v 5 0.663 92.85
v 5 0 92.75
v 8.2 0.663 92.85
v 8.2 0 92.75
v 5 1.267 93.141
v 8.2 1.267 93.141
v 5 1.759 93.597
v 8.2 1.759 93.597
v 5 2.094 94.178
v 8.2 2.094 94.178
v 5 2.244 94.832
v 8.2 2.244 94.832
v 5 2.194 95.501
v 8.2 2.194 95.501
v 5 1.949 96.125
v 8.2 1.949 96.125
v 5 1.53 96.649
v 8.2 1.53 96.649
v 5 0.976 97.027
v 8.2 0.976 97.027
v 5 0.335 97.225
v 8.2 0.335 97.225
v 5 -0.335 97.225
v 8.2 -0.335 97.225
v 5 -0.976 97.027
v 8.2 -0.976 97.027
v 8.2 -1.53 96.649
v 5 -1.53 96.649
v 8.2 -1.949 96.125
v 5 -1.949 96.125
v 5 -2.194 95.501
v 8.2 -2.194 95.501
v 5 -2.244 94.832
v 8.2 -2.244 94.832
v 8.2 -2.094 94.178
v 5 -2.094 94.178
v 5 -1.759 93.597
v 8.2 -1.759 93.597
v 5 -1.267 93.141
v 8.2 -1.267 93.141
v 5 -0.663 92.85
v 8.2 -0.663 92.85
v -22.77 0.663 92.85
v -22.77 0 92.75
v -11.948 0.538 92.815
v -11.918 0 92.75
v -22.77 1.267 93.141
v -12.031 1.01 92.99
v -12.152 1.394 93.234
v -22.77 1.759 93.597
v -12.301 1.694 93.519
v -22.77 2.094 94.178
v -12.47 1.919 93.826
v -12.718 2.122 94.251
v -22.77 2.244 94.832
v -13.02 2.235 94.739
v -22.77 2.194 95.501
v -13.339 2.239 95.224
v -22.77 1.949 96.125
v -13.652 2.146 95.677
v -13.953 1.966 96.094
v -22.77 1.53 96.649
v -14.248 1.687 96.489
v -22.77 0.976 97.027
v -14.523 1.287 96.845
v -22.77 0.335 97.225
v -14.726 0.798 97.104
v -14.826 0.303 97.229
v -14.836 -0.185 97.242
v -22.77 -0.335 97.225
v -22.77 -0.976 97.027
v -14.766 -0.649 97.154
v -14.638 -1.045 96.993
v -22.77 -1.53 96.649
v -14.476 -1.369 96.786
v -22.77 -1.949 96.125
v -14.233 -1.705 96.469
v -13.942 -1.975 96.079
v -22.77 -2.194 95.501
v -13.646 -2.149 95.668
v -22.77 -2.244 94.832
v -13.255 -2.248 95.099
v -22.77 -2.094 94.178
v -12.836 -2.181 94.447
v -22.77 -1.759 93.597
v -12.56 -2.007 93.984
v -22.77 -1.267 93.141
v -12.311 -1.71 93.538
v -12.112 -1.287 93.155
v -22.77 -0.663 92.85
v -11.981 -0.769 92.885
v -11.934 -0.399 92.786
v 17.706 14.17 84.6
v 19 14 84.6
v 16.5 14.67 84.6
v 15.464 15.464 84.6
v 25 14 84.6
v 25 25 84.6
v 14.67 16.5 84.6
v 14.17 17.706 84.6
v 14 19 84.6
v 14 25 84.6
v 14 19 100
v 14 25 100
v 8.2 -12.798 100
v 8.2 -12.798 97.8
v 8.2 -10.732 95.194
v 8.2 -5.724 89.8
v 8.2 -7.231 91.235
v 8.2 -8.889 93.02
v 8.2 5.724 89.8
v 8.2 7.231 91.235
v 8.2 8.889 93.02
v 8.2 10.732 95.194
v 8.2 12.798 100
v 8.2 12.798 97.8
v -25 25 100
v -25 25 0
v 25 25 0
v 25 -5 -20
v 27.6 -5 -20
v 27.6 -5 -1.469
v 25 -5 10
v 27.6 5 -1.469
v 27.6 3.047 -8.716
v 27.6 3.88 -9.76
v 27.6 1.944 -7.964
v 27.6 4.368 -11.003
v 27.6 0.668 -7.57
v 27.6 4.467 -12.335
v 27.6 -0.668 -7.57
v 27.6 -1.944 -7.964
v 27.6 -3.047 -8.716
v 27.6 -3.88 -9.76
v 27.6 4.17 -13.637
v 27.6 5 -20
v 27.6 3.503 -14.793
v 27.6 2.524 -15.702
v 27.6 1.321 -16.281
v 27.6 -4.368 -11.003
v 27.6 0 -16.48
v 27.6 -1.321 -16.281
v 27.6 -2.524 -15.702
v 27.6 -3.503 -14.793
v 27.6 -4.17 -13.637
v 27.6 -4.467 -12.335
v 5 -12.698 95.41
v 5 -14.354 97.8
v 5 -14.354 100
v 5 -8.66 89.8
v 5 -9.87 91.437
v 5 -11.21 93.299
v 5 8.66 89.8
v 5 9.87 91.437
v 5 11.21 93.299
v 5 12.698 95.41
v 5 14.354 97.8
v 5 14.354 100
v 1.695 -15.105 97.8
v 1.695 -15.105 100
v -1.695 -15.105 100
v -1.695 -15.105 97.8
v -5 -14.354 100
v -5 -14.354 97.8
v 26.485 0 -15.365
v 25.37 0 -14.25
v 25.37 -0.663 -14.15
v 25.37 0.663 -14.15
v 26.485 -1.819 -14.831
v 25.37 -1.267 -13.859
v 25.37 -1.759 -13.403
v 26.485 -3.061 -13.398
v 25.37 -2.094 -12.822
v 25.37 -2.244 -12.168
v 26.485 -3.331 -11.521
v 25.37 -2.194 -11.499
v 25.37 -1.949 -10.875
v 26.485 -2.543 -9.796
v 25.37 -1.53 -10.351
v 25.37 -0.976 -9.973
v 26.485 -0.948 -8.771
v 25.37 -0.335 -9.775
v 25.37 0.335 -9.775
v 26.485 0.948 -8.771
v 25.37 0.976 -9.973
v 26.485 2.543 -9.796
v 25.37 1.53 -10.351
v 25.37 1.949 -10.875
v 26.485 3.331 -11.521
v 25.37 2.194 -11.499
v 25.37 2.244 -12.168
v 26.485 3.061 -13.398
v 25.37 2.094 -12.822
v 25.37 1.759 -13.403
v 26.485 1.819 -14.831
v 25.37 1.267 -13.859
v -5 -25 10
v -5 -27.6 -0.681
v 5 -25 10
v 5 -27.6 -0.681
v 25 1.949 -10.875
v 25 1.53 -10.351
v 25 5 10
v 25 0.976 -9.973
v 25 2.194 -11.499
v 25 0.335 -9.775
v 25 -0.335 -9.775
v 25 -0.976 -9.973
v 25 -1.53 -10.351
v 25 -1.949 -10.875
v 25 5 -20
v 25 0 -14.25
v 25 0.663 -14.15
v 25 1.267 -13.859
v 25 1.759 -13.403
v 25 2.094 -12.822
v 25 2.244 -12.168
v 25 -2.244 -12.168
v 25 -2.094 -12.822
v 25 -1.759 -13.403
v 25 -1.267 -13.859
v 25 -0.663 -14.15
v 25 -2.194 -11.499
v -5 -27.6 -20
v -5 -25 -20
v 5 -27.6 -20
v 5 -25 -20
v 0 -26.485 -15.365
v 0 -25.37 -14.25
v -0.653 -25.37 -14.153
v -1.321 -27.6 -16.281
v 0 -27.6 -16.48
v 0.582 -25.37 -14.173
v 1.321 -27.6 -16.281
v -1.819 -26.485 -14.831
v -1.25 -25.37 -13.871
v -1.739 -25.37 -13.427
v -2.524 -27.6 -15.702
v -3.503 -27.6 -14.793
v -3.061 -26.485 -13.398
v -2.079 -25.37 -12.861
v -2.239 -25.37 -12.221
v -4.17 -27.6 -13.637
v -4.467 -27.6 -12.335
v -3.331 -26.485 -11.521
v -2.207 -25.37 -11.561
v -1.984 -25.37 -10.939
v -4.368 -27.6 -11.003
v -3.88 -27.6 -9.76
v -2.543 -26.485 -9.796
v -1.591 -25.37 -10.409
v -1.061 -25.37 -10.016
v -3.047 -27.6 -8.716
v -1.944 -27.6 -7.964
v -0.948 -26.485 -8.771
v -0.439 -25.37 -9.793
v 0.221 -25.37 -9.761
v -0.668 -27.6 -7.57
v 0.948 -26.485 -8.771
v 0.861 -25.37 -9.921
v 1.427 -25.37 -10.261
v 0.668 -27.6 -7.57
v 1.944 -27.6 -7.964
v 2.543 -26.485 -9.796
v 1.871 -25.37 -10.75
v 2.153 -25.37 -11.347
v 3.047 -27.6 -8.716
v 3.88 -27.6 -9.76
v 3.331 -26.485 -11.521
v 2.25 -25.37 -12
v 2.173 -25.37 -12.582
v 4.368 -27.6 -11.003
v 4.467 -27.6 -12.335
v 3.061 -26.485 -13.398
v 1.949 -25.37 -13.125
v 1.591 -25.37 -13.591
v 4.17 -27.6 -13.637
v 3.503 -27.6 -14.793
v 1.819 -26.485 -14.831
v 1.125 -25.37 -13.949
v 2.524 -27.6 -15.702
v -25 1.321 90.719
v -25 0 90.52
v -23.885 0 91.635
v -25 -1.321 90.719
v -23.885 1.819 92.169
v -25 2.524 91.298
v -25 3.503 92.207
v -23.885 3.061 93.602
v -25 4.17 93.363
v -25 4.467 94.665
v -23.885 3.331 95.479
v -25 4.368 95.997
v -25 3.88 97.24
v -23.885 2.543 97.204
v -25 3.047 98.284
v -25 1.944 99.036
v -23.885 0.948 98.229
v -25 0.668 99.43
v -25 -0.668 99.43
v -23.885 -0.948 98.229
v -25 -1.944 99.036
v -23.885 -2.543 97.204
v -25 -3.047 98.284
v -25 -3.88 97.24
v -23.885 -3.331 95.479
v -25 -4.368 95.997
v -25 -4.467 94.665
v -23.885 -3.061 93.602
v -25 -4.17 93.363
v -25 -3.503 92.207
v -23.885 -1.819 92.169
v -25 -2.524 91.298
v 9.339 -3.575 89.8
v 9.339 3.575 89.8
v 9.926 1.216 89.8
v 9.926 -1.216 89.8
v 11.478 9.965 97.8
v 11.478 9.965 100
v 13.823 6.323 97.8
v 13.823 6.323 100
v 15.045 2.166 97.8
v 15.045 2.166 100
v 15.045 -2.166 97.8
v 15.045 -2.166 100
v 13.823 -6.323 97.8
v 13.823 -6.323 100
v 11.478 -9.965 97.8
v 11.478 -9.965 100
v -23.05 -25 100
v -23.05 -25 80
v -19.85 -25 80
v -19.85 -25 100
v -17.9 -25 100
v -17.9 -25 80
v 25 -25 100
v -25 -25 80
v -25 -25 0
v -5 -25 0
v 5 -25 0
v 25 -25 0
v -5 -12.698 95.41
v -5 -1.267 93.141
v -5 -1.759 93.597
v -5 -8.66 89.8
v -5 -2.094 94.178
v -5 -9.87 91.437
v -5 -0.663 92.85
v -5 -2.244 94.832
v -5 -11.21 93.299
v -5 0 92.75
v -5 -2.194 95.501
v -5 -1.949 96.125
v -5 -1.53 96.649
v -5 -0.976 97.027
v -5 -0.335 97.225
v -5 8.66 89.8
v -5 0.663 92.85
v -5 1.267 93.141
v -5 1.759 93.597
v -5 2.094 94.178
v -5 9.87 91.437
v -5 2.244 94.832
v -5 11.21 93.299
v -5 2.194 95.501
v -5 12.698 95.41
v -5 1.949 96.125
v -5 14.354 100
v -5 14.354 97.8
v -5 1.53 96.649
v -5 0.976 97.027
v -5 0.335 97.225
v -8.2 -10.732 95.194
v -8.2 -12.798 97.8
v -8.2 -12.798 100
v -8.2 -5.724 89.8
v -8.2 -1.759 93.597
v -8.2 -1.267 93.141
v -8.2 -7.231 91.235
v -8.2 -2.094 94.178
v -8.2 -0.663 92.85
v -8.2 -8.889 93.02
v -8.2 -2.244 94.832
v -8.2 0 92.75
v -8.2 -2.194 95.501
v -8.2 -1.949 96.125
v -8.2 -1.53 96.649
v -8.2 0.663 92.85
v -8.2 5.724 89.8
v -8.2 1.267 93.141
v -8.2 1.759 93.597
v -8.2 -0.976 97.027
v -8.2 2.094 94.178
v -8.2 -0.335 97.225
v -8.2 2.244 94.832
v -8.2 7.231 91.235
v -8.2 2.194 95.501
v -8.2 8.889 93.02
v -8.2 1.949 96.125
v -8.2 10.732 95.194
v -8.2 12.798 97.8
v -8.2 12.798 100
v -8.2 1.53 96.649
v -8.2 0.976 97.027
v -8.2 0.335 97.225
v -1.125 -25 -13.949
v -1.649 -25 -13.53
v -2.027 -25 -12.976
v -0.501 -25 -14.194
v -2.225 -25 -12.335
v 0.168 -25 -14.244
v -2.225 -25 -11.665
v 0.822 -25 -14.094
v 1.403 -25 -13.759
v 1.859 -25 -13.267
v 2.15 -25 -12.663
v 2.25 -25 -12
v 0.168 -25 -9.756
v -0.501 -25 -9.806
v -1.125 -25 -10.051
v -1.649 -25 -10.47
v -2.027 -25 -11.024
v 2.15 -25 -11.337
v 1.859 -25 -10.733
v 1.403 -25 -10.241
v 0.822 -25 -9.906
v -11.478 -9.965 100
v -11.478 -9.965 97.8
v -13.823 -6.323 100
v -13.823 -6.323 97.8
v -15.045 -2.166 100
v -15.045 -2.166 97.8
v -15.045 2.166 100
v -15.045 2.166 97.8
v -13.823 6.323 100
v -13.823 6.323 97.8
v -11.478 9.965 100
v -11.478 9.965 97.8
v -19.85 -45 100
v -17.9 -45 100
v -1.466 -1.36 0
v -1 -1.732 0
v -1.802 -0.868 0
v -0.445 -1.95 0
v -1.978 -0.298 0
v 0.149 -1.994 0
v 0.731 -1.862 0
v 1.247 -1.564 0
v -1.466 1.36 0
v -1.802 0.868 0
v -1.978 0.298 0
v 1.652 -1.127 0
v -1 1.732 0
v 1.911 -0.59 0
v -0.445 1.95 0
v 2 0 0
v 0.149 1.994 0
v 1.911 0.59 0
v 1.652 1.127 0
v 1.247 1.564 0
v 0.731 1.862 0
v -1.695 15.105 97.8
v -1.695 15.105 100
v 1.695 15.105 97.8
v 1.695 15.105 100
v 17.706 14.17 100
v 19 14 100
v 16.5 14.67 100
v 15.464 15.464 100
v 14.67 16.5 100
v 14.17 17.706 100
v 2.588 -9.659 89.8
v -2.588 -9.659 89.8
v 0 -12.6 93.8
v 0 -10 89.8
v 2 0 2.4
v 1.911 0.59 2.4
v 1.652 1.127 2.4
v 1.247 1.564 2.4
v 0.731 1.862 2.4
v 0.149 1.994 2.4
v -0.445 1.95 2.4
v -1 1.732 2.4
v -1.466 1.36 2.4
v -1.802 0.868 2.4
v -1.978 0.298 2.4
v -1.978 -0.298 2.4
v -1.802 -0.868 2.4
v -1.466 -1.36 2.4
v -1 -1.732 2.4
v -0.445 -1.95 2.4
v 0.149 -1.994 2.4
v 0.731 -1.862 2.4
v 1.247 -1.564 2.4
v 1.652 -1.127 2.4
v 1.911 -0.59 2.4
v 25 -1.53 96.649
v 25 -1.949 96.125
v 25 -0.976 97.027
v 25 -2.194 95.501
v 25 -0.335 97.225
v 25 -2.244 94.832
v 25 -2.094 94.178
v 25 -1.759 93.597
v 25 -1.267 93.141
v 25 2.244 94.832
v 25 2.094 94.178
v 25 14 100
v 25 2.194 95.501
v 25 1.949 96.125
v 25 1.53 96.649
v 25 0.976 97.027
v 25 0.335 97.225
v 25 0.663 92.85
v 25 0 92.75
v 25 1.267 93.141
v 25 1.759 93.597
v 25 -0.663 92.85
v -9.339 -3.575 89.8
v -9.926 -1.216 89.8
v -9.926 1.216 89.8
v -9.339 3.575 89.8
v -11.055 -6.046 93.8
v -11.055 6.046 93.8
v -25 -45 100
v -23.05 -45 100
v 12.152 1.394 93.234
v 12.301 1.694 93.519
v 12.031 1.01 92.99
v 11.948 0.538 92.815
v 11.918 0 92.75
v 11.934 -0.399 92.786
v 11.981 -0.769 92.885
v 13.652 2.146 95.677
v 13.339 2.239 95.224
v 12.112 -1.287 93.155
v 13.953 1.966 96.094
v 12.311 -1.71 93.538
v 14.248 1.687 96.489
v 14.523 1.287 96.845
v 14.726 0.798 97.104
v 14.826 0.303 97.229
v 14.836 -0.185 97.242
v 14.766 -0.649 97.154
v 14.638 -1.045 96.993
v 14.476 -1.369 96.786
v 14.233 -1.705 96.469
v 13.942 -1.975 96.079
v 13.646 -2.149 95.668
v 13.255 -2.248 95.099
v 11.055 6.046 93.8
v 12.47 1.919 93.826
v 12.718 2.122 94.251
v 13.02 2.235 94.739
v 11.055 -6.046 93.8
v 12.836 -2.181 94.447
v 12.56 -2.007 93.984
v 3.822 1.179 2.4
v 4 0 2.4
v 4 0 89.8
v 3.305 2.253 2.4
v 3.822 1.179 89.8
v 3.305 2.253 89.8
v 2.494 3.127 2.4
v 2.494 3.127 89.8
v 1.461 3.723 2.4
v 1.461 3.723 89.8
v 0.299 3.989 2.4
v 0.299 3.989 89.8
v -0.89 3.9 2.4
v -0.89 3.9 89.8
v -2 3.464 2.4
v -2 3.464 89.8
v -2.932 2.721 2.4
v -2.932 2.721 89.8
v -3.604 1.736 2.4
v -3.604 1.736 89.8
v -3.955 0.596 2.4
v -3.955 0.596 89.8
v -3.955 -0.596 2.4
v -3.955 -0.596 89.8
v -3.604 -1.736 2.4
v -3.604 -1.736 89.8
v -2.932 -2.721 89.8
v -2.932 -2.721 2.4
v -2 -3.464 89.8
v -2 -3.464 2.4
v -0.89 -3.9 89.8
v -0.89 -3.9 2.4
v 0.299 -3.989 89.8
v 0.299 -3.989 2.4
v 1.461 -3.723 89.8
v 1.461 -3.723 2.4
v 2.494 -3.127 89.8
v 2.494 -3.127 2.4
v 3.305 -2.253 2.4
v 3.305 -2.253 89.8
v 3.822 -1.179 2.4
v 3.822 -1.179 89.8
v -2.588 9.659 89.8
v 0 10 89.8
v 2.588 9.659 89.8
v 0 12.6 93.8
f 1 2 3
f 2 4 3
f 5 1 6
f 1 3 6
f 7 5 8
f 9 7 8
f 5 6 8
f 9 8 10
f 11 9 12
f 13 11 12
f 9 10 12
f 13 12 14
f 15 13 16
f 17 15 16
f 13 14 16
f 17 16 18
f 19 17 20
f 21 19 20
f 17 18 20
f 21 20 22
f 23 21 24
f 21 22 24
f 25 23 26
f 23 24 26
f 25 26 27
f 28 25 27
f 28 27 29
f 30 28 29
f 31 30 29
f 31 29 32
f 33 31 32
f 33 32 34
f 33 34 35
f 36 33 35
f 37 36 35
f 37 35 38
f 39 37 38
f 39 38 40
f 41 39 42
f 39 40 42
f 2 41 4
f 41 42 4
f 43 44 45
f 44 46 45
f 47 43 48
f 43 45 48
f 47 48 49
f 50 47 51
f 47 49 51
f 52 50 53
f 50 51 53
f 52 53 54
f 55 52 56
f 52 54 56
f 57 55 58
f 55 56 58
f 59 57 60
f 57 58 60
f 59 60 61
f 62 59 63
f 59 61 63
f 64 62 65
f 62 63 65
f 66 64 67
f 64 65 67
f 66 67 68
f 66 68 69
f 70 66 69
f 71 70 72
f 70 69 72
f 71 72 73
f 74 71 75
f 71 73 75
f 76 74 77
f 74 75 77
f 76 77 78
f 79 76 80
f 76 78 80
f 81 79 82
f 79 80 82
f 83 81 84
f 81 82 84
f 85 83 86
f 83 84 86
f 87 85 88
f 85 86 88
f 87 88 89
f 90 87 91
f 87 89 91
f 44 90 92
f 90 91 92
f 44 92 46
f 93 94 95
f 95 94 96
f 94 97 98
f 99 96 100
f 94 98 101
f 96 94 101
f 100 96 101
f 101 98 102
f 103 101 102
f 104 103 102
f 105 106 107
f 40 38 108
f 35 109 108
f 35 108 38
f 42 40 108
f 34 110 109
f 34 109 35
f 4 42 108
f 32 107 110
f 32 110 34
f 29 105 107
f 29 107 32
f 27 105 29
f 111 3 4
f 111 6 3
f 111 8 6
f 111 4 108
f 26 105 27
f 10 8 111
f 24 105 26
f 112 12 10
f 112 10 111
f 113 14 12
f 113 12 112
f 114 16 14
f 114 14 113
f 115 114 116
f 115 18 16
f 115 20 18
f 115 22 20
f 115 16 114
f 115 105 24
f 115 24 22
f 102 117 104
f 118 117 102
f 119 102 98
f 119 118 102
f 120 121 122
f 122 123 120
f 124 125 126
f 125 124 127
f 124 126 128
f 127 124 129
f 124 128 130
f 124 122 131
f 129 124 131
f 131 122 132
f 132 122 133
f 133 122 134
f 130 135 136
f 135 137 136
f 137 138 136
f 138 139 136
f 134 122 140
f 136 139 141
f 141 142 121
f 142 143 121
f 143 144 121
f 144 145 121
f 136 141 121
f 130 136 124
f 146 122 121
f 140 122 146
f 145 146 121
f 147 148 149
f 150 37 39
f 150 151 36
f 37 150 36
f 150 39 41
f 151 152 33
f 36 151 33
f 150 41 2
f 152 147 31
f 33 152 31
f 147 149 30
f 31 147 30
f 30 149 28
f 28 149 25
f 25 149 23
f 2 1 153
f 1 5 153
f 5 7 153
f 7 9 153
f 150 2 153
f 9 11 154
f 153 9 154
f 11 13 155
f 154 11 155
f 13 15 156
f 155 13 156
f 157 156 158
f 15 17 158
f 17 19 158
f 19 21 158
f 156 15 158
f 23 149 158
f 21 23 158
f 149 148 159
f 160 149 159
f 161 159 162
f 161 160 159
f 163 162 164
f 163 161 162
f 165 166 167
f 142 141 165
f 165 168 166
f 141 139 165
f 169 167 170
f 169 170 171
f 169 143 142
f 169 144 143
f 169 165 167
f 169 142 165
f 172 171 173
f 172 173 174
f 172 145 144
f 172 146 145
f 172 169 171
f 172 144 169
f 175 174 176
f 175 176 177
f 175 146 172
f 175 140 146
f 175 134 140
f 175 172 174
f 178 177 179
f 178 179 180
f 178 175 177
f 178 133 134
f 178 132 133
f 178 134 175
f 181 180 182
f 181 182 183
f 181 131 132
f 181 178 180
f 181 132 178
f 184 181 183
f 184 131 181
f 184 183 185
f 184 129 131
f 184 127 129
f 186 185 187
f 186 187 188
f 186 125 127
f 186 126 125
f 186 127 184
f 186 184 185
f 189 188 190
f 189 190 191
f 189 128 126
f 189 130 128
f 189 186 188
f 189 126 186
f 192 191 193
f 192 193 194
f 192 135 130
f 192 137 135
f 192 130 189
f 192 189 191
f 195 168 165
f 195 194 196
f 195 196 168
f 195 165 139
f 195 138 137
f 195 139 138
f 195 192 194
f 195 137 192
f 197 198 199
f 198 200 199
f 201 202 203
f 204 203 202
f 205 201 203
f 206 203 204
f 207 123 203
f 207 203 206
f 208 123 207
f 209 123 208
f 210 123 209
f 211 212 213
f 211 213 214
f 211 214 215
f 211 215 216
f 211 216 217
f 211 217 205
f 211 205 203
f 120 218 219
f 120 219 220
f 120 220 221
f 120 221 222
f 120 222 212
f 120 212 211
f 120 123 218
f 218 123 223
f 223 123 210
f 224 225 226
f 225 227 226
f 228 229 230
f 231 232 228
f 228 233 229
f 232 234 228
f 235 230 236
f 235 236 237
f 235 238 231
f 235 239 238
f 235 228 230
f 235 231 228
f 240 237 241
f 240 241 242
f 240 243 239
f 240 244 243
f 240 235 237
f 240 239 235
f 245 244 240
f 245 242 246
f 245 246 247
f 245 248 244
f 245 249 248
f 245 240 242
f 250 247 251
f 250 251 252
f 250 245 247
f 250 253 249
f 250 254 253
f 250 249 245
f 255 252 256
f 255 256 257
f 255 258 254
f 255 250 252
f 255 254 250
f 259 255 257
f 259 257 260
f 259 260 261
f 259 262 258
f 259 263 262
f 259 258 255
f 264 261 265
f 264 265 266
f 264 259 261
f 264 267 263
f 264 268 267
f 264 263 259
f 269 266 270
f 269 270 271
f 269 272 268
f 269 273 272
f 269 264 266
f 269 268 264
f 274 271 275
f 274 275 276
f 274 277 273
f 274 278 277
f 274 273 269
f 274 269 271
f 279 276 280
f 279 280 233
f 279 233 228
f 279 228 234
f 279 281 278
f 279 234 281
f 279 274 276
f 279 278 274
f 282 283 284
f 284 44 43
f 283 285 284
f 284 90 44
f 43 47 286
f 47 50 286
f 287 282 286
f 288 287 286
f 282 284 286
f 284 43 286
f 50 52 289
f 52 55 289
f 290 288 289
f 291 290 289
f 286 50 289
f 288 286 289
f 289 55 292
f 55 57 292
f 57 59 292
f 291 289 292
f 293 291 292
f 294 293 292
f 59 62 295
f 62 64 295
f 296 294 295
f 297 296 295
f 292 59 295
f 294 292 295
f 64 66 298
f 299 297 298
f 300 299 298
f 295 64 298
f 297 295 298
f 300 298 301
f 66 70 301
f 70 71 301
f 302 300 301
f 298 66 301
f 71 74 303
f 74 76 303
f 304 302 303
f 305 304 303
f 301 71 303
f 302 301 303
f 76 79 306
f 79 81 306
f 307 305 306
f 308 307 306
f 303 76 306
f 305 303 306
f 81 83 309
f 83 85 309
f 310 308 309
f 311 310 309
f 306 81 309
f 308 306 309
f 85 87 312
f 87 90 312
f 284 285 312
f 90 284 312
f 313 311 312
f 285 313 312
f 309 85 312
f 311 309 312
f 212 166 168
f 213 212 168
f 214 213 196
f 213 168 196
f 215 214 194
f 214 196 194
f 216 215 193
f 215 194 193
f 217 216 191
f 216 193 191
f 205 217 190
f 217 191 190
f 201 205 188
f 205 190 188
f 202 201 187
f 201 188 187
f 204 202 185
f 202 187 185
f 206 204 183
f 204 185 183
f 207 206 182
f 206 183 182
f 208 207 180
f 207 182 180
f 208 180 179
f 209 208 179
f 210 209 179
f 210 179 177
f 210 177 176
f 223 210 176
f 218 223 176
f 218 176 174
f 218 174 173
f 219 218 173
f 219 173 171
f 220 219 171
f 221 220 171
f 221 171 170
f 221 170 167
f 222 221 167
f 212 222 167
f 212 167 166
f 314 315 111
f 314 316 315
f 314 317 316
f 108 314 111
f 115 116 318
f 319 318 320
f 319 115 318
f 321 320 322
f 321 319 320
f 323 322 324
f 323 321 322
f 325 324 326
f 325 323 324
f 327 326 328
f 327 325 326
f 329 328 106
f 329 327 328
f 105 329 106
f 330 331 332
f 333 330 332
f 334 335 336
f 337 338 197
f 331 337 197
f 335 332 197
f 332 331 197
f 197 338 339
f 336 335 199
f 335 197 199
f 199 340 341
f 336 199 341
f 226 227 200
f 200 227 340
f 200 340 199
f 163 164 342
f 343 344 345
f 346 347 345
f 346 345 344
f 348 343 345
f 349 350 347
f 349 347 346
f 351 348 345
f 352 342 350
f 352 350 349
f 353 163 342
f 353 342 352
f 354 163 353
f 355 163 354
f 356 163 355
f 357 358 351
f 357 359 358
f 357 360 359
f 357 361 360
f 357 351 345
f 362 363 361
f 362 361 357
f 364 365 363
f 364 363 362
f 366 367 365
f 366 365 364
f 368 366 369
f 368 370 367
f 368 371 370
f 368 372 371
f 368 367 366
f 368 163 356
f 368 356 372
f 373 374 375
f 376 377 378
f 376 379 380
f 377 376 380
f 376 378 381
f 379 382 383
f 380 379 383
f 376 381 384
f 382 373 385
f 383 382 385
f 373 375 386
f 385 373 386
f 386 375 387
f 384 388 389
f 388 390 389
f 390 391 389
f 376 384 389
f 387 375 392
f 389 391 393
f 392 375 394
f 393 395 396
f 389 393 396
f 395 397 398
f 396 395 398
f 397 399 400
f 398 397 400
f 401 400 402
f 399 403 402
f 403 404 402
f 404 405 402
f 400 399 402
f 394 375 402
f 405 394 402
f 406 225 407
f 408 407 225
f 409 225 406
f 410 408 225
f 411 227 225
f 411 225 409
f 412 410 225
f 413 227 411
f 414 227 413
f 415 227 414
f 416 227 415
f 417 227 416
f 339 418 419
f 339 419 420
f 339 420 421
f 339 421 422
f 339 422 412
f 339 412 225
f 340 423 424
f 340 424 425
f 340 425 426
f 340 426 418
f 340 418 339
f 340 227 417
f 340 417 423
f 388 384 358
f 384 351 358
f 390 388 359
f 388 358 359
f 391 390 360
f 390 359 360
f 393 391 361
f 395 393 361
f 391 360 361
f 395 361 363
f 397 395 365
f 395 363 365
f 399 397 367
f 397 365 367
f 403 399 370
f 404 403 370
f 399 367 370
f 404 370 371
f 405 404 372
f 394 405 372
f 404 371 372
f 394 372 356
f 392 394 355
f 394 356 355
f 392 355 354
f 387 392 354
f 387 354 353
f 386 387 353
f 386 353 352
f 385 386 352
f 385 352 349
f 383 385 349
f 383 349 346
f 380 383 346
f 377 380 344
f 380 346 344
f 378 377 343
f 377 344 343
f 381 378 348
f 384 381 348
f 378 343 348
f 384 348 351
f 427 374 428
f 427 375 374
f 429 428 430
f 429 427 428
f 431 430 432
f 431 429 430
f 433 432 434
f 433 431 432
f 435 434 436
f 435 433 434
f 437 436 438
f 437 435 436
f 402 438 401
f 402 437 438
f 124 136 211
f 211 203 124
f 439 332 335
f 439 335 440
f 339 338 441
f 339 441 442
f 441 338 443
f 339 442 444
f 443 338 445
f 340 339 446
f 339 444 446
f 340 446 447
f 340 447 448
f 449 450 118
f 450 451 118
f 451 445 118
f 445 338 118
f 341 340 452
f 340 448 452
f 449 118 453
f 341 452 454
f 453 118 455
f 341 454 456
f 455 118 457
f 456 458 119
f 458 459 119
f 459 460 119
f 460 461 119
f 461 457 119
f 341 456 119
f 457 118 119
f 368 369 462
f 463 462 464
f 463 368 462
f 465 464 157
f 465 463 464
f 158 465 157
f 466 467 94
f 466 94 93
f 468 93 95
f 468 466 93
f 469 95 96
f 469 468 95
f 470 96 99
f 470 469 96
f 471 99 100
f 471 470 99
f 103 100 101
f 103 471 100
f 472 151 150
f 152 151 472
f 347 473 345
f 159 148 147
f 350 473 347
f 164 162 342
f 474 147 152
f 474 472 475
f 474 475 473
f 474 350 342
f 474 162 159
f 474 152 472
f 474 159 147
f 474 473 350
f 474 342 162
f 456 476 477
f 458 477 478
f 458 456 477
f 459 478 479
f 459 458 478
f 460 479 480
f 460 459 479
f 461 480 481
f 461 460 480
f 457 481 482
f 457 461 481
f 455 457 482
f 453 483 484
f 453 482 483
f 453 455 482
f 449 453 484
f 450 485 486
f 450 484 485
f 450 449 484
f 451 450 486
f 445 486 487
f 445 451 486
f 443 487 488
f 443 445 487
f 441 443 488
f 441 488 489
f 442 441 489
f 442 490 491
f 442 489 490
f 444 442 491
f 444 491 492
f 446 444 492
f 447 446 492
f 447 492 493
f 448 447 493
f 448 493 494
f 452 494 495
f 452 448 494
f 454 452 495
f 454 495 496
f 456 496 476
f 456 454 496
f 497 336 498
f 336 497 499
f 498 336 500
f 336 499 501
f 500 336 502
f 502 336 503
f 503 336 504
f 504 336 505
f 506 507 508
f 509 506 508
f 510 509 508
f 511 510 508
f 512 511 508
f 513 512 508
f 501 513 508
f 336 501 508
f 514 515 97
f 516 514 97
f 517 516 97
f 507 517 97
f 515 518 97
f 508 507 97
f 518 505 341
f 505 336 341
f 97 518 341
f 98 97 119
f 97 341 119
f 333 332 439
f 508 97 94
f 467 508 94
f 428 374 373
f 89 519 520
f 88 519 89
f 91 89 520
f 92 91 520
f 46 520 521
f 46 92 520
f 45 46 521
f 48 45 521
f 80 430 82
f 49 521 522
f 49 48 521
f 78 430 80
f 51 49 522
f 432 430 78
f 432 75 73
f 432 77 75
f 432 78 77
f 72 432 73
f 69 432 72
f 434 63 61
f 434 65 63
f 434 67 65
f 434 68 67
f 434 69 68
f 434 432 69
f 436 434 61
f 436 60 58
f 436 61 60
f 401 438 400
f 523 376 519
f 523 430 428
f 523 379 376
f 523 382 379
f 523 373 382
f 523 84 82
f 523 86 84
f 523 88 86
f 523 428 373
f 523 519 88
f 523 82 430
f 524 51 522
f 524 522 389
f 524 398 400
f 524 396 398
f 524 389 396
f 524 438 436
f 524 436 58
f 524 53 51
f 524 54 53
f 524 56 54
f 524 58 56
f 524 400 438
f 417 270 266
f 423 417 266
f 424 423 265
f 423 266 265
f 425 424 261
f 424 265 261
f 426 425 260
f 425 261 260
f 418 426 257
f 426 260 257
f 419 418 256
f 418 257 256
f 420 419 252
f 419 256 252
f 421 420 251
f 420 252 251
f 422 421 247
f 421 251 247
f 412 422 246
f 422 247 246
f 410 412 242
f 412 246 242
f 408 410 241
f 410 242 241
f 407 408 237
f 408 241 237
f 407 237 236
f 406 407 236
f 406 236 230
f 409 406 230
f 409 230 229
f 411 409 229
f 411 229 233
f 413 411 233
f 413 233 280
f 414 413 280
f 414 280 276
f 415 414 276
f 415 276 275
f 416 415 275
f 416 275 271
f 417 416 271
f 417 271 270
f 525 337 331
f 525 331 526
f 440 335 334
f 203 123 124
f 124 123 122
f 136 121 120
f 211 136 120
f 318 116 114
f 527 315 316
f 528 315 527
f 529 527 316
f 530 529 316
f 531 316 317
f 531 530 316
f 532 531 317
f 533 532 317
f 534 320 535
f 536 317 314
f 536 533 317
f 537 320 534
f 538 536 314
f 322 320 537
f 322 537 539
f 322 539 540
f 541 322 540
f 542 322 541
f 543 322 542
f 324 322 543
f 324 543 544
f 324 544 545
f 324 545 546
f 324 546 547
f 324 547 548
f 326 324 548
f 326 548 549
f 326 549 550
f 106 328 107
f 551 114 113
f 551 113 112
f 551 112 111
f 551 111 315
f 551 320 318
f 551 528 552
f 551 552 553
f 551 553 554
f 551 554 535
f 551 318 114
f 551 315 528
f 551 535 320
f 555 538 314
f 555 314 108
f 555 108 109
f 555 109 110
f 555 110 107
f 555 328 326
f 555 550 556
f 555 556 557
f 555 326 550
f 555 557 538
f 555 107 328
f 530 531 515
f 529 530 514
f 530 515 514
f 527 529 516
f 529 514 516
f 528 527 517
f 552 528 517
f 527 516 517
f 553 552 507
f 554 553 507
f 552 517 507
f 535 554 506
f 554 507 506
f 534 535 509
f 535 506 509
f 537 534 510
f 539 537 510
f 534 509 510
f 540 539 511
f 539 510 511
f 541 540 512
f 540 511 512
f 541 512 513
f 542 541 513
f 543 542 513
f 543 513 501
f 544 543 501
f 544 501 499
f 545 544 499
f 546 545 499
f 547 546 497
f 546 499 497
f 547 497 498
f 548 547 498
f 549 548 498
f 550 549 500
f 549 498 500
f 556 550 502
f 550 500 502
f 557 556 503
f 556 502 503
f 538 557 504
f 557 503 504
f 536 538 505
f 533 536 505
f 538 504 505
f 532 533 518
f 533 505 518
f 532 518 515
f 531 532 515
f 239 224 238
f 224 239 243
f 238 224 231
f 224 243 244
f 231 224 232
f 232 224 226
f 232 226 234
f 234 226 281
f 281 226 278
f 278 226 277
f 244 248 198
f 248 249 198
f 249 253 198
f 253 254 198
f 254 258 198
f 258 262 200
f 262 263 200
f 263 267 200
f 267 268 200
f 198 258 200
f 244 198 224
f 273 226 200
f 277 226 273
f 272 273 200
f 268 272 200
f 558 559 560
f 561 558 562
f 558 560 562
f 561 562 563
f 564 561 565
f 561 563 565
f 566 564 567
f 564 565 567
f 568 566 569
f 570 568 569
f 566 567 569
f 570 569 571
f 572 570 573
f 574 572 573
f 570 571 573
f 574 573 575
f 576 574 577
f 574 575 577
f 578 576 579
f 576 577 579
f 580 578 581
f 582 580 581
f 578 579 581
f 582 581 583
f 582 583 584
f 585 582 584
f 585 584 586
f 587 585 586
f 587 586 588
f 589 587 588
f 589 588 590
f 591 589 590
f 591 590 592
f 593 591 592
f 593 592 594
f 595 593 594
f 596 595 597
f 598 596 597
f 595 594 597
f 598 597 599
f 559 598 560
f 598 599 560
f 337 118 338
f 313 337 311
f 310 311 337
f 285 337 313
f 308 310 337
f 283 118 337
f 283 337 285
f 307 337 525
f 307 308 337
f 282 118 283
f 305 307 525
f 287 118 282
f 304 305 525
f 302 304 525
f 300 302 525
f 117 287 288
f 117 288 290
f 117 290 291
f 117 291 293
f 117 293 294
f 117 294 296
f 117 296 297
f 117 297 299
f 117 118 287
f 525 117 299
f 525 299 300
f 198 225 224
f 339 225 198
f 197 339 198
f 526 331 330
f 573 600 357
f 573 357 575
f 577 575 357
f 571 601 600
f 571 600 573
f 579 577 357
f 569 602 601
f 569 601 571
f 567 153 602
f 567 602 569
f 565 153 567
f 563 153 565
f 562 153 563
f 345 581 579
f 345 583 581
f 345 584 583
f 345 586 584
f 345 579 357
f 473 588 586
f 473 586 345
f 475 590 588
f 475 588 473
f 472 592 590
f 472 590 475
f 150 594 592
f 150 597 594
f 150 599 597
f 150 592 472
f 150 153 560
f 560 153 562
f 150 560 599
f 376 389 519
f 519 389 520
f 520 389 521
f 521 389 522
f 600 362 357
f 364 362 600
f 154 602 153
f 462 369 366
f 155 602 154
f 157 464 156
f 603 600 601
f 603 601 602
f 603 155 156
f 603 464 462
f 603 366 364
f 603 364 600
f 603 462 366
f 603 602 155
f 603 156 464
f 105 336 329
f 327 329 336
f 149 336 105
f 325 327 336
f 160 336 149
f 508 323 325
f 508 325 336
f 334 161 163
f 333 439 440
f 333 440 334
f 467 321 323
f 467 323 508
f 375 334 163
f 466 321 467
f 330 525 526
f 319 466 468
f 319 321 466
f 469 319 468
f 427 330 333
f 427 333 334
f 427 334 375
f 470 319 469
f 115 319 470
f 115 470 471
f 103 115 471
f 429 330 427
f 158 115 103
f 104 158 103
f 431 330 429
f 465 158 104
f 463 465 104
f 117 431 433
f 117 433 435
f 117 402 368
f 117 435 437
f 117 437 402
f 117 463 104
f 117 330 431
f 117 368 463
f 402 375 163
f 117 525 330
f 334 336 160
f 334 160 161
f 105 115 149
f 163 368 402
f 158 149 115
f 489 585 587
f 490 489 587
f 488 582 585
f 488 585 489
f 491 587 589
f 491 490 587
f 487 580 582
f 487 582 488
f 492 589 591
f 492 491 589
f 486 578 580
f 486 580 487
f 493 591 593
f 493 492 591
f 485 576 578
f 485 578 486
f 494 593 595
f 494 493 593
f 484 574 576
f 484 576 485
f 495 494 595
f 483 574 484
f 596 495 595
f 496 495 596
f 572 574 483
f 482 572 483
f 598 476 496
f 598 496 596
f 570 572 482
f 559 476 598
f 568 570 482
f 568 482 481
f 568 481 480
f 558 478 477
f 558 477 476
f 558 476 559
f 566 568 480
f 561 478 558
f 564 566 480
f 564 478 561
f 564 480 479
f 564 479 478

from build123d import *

# Parameters (mm, degrees)
CROQUIS1_W                                           = 50
CROQUIS1_H                                           = 50
CROQUIS1_R                                           = 2
SALIENTE_EXTRUIR2_DEPTH                              = 100
CROQUIS4_W                                           = 3.2
CROQUIS4_H                                           = 40
SALIENTE_EXTRUIR5_DEPTH                              = 10.2
CROQUIS8_R                                           = 4
CORTAR_EXTRUIR3_DEPTH                                = 87.4
CORTAR_EXTRUIR2_START                                = -50
CROQUIS7_R                                           = 2
CORTAR_EXTRUIR2_DEPTH                                = 50
REFRENTADO_PARA_TORNILLO_TAP_N_CON_CABEZ_D           = 4.5
REFRENTADO_PARA_TORNILLO_TAP_N_CON_CABEZ_CSINK_D     = 8.96
REFRENTADO_PARA_TORNILLO_TAP_N_CON_CABEZ_CSINK_ANGLE = 90
SALIENTE_EXTRUIR6_DEPTH                              = 1.95
SALIENTE_EXTRUIR7_START                              = -5.15
SALIENTE_EXTRUIR7_DEPTH                              = 1.95
CORTAR_EXTRUIR4_DEPTH                                = 15.4
SALIENTE_EXTRUIR8_START                              = -25
SALIENTE_EXTRUIR8_DEPTH                              = 5
SALIENTE_EXTRUIR8_DEPTH_BACK                         = 5
CROQUIS15_R                                          = 2.25
CORTAR_EXTRUIR5_DEPTH                                = 2.6
SALIENTE_EXTRUIR9_START                              = -25
SALIENTE_EXTRUIR9_DEPTH                              = 5
SALIENTE_EXTRUIR9_DEPTH_BACK                         = 5
CROQUIS19_R                                          = 2.25
CORTAR_EXTRUIR6_DEPTH                                = 2.6


with BuildPart() as part:
    # Croquis1 → Saliente-Extruir2 (new body)
    with BuildSketch(Plane.XY):
        Rectangle(CROQUIS1_W, CROQUIS1_H)
        Circle(CROQUIS1_R, mode=Mode.SUBTRACT)
    extrude(amount=SALIENTE_EXTRUIR2_DEPTH)

    # Croquis2 → Cortar-Revolución1 (revolve, cut)
    with BuildSketch(Plane(origin=(0, 0, 0), x_dir=(0, 0, -1), z_dir=(1, 0, 0))):
        Polygon((-100, 15.2), (-100, 0), (-89.8, 0), (-89.8, 10), (-97.8, 15.2), align=None)
    revolve(axis=Axis((0, 0, 100), (0, 0, -1)), mode=Mode.SUBTRACT)

    # Croquis4 → Saliente-Extruir5 (add)
    with BuildSketch(Plane.XY.offset(100)):
        with Locations((-6.6, 0)):
            Rectangle(CROQUIS4_W, CROQUIS4_H)
        with Locations((6.6, 0)):
            Rectangle(CROQUIS4_W, CROQUIS4_H)
    extrude(amount=-SALIENTE_EXTRUIR5_DEPTH)

    # Croquis8 → Cortar-Extruir3 (cut)
    with BuildSketch(Plane.XY.offset(89.8)):
        Circle(CROQUIS8_R)
    extrude(amount=-CORTAR_EXTRUIR3_DEPTH, mode=Mode.SUBTRACT)

    # Croquis7 → Cortar-Extruir2 (cut)
    with BuildSketch(Plane.ZY.offset(25).offset(CORTAR_EXTRUIR2_START)):
        with Locations((95, 0)):
            Circle(CROQUIS7_R)
    extrude(amount=CORTAR_EXTRUIR2_DEPTH, mode=Mode.SUBTRACT)

    # Refrentado para tornillo tap_n con cabez (through all)
    with Locations(Plane.ZY.offset(25)):
        with Locations((95, 0)):
            CounterSinkHole(REFRENTADO_PARA_TORNILLO_TAP_N_CON_CABEZ_D / 2, REFRENTADO_PARA_TORNILLO_TAP_N_CON_CABEZ_CSINK_D / 2, counter_sink_angle=REFRENTADO_PARA_TORNILLO_TAP_N_CON_CABEZ_CSINK_ANGLE)

    # Croquis12 → Saliente-Extruir6 (add)
    with BuildSketch(Plane.ZY.offset(25)):
        Polygon((100, -25), (80, -25), (100, -45), align=None)
    extrude(amount=-SALIENTE_EXTRUIR6_DEPTH)

    # Croquis12<2> → Saliente-Extruir7 (add)
    with BuildSketch(Plane.ZY.offset(25).offset(SALIENTE_EXTRUIR7_START)):
        Polygon((100, -25), (80, -25), (100, -45), align=None)
    extrude(amount=-SALIENTE_EXTRUIR7_DEPTH)

    # Croquis13 → Cortar-Extruir4 (cut)
    with BuildSketch(Plane.XY.offset(100)):
        with BuildLine():
            Line((25, 25), (25, 14))
            Line((25, 14), (19, 14))
            ThreePointArc((19, 14), (15.464466094, 15.464466094), (14, 19))
            Line((14, 19), (14, 25))
            Line((14, 25), (25, 25))
        make_face()
    extrude(amount=-CORTAR_EXTRUIR4_DEPTH, mode=Mode.SUBTRACT)

    # Croquis18 → Saliente-Extruir9 (add, two sides)
    with BuildSketch(Plane(origin=(25, 0, 0), x_dir=(0, 0, -1), z_dir=(1, 0, 0)).offset(SALIENTE_EXTRUIR9_START)) as saliente_extruir9_sk:
        Polygon((0, -25), (20, -25), (20, -27.6), (0.681044045, -27.6), (-10, -25), align=None)
    extrude(amount=SALIENTE_EXTRUIR9_DEPTH)
    extrude(saliente_extruir9_sk.sketch, amount=-SALIENTE_EXTRUIR9_DEPTH_BACK)

    # Croquis19 → Cortar-Extruir6 (cut)
    with BuildSketch(Plane.XZ.offset(27.6)):
        with Locations((0, -12)):
            Circle(CROQUIS19_R)
    extrude(amount=-CORTAR_EXTRUIR6_DEPTH, mode=Mode.SUBTRACT)

    # Croquis21 → Refrentado para tornillo tap_n con c 3 (revolve, cut)
    with BuildSketch(Plane(origin=(0, -27.6, -12), x_dir=(0, 0, -1), z_dir=(1, 0, 0))):
        Polygon((0, 0), (0, 52.6), (2.25, 52.6), (2.25, 2.23), (4.48, 0), align=None)
    revolve(axis=Axis((0, -33.95, -12), (0, 1, 0)), mode=Mode.SUBTRACT)


with BuildPart() as body_2:
    # Croquis14 → Saliente-Extruir8 (new body, two sides)
    with BuildSketch(Plane.XZ.offset(25).offset(SALIENTE_EXTRUIR8_START)) as saliente_extruir8_sk:
        Polygon((25, 0), (25, 10), (27.6, -1.469215888), (27.6, -20), (25, -20), align=None)
    extrude(amount=SALIENTE_EXTRUIR8_DEPTH)
    extrude(saliente_extruir8_sk.sketch, amount=-SALIENTE_EXTRUIR8_DEPTH_BACK)

    # Croquis15 → Cortar-Extruir5 (cut)
    with BuildSketch(Plane(origin=(27.6, 0, 0), x_dir=(0, 0, -1), z_dir=(1, 0, 0))):
        with Locations((12, 0)):
            Circle(CROQUIS15_R)
    extrude(amount=-CORTAR_EXTRUIR5_DEPTH, mode=Mode.SUBTRACT)

    # Croquis17 → Refrentado para tornillo tap_n con c 2 (revolve, cut)
    with BuildSketch(Plane(origin=(27.6, 0, -12), x_dir=(0, 0, -1), z_dir=(0, 1, 0))):
        Polygon((0, 0), (0, 52.6), (2.25, 52.6), (2.25, 2.23), (4.48, 0), align=None)
    revolve(axis=Axis((33.95, 0, -12), (-1, 0, 0)), mode=Mode.SUBTRACT)


solid = Compound([part.part, body_2.part])
